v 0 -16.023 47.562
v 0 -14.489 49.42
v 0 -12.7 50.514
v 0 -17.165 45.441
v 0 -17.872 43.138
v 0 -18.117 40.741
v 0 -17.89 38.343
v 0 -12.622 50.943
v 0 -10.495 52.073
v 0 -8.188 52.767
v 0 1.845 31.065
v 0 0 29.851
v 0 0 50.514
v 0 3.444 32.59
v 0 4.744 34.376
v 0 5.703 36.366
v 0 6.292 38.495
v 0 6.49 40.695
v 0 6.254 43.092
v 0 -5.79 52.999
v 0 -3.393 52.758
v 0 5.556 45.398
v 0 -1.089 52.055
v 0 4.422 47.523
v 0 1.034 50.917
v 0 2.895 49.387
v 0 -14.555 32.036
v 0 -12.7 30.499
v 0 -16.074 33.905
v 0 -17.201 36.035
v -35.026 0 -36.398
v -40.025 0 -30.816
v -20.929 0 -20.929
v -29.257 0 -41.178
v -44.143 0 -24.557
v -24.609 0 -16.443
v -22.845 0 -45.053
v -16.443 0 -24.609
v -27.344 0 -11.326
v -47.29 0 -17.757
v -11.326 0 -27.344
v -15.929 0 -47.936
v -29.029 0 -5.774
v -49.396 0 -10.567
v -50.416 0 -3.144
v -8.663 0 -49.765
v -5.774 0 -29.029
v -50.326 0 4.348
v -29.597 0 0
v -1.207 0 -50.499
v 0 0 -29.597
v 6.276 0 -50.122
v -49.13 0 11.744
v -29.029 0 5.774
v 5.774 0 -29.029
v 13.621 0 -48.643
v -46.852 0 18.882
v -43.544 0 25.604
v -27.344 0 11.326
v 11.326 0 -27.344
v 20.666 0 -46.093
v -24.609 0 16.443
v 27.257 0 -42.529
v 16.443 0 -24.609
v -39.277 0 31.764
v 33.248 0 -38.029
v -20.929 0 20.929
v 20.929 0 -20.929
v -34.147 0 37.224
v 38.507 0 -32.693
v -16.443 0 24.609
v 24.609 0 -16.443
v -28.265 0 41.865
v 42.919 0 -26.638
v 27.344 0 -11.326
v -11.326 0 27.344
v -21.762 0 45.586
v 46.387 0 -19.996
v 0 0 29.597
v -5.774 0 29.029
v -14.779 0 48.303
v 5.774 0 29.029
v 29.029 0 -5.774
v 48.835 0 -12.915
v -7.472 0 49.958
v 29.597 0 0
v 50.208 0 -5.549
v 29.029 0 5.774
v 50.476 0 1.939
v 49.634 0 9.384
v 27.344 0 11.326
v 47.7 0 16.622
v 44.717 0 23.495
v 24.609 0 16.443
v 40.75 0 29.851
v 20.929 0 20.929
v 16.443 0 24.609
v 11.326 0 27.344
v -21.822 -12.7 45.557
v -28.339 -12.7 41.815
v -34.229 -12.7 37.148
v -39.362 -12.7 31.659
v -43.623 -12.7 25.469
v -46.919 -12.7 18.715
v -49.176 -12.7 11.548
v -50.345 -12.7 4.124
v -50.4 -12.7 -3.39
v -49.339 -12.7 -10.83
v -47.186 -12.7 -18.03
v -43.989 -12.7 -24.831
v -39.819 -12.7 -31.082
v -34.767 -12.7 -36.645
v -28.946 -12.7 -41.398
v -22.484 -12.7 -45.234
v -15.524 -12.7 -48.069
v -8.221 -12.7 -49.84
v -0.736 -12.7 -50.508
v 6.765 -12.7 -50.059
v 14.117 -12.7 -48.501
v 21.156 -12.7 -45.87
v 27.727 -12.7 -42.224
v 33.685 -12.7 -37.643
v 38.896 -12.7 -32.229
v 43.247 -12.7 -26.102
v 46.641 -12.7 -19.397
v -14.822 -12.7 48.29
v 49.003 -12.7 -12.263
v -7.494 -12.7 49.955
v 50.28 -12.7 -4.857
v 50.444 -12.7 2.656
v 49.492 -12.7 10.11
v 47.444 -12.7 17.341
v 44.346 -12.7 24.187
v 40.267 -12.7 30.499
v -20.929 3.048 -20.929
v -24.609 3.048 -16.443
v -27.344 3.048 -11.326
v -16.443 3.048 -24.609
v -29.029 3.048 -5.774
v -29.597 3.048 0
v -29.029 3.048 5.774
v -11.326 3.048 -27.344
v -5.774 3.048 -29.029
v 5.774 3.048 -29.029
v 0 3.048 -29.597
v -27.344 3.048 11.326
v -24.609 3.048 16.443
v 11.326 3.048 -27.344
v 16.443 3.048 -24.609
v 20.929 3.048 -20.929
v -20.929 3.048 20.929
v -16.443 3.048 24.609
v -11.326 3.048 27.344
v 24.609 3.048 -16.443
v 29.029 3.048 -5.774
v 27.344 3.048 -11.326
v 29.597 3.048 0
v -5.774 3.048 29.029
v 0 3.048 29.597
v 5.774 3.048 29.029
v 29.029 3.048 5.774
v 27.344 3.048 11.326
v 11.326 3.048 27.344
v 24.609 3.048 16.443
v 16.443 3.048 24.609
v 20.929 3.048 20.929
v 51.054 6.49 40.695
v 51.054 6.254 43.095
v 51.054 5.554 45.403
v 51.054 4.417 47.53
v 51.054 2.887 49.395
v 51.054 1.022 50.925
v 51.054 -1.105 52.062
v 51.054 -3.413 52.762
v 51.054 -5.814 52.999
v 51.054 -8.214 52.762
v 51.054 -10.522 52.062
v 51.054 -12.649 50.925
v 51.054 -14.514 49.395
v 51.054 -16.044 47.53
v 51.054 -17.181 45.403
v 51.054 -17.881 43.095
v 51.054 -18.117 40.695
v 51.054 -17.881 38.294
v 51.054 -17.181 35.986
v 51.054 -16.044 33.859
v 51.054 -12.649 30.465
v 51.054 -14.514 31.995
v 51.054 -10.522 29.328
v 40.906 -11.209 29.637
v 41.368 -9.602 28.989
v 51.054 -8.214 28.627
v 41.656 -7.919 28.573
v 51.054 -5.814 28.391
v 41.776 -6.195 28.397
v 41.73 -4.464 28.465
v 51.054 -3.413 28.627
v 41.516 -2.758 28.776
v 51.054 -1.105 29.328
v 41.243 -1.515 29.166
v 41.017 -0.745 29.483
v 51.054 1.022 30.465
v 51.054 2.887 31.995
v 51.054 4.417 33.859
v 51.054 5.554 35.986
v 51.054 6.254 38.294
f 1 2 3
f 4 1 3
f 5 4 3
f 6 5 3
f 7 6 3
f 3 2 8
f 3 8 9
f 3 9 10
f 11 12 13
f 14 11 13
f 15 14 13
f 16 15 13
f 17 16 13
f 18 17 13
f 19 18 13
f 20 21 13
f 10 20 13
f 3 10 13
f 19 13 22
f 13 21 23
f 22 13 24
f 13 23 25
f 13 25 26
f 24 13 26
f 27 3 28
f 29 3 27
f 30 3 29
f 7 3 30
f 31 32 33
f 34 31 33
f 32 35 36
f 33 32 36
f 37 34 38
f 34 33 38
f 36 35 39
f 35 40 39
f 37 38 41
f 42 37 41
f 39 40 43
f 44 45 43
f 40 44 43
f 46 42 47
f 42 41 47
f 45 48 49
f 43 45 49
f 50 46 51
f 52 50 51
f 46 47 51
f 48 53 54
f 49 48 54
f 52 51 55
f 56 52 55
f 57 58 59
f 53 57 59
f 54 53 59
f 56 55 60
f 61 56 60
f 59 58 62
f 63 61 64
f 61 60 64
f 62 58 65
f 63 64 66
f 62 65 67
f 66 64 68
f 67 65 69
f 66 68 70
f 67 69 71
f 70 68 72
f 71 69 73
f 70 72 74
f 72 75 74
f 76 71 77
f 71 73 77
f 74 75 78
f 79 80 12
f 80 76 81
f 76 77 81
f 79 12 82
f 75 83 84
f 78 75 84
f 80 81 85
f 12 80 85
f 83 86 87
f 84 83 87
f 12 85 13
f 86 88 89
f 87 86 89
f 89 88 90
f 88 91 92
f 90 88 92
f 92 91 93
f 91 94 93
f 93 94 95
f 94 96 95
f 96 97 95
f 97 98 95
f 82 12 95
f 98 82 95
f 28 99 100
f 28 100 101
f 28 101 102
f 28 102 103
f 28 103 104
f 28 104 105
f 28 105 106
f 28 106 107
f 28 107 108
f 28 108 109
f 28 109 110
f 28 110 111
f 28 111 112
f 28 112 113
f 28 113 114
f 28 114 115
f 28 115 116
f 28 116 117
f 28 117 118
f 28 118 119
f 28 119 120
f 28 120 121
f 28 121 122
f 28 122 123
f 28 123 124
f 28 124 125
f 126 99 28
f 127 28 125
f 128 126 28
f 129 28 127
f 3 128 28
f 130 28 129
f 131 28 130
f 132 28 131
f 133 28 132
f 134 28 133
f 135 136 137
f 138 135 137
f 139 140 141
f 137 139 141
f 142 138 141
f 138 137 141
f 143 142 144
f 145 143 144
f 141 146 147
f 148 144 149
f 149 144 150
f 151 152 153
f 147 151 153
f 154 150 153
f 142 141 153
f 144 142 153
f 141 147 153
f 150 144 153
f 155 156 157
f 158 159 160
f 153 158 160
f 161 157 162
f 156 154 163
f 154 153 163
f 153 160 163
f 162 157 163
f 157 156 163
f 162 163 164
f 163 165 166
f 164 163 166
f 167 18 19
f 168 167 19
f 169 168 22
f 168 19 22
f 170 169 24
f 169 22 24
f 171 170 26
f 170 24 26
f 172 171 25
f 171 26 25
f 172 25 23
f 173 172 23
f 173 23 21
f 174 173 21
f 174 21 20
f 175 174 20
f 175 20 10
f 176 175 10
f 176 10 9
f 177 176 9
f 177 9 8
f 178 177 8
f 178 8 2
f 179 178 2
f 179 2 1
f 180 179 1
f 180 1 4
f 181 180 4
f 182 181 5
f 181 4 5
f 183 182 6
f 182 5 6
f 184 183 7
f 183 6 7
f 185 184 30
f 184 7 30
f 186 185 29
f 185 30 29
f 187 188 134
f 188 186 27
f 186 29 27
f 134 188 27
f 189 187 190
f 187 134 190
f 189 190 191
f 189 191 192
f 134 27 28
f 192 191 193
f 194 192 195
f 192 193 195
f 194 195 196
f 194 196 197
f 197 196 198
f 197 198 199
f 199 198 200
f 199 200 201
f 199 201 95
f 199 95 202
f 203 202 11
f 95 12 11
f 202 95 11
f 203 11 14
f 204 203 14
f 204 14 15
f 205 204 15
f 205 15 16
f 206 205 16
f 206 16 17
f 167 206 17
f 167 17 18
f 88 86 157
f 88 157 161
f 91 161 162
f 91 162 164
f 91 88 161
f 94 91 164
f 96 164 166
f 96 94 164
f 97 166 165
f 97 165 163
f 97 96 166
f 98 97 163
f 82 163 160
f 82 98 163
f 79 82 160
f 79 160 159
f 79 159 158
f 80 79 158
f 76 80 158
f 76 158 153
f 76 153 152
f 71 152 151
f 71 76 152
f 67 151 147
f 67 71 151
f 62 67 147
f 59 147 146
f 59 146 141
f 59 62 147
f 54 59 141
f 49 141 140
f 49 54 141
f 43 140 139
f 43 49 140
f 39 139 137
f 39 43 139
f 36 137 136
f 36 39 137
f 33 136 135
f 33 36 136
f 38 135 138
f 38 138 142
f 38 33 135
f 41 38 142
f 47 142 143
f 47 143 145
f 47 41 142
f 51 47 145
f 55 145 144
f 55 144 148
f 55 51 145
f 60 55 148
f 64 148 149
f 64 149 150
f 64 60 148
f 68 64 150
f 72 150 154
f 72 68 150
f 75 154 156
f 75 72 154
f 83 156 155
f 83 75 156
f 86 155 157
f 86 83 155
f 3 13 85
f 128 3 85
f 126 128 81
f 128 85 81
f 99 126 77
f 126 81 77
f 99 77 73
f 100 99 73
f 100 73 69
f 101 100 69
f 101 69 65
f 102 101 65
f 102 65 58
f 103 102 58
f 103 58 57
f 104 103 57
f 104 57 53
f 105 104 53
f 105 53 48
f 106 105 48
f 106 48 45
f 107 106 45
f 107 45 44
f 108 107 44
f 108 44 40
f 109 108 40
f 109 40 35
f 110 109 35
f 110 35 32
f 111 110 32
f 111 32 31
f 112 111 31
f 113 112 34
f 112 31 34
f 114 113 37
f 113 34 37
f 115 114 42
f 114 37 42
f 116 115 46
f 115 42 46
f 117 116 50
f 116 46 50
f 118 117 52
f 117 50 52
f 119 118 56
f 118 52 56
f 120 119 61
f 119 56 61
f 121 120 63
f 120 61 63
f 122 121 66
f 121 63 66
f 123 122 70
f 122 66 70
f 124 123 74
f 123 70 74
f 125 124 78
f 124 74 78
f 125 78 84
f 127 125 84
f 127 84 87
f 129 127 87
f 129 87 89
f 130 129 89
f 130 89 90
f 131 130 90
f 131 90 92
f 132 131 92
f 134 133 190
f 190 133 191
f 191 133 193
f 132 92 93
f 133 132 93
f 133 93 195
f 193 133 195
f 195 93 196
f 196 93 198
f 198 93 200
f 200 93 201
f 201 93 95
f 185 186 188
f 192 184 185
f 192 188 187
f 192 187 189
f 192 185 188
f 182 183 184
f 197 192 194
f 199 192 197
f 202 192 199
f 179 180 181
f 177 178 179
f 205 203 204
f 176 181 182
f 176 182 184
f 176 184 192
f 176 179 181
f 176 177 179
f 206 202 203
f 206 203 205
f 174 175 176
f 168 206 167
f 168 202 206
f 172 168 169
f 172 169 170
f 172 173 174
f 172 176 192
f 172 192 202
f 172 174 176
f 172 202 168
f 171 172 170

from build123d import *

# Parameters (mm, degrees)
F0_R     = 50.513701
F1_DEPTH = 12.7
F2_R     = 12.303799
F3_DEPTH = 51.054
F4_R     = 29.597437
F5_DEPTH = 3.048


with BuildPart() as f1:
    # F0 (on Front) → F1 (new body)
    with BuildSketch(Plane.XZ):
        Circle(F0_R)
    extrude(amount=F1_DEPTH)

    # F2 (on Right) → F3 (join)
    with BuildSketch(Plane.YZ):
        with Locations((-5.813534, 40.69474)):
            Circle(F2_R)
    extrude(amount=F3_DEPTH)

    # F4 (on Front) → F5 (join)
    with BuildSketch(Plane.XZ):
        Circle(F4_R)
    extrude(amount=-F5_DEPTH)


solid = f1.part
